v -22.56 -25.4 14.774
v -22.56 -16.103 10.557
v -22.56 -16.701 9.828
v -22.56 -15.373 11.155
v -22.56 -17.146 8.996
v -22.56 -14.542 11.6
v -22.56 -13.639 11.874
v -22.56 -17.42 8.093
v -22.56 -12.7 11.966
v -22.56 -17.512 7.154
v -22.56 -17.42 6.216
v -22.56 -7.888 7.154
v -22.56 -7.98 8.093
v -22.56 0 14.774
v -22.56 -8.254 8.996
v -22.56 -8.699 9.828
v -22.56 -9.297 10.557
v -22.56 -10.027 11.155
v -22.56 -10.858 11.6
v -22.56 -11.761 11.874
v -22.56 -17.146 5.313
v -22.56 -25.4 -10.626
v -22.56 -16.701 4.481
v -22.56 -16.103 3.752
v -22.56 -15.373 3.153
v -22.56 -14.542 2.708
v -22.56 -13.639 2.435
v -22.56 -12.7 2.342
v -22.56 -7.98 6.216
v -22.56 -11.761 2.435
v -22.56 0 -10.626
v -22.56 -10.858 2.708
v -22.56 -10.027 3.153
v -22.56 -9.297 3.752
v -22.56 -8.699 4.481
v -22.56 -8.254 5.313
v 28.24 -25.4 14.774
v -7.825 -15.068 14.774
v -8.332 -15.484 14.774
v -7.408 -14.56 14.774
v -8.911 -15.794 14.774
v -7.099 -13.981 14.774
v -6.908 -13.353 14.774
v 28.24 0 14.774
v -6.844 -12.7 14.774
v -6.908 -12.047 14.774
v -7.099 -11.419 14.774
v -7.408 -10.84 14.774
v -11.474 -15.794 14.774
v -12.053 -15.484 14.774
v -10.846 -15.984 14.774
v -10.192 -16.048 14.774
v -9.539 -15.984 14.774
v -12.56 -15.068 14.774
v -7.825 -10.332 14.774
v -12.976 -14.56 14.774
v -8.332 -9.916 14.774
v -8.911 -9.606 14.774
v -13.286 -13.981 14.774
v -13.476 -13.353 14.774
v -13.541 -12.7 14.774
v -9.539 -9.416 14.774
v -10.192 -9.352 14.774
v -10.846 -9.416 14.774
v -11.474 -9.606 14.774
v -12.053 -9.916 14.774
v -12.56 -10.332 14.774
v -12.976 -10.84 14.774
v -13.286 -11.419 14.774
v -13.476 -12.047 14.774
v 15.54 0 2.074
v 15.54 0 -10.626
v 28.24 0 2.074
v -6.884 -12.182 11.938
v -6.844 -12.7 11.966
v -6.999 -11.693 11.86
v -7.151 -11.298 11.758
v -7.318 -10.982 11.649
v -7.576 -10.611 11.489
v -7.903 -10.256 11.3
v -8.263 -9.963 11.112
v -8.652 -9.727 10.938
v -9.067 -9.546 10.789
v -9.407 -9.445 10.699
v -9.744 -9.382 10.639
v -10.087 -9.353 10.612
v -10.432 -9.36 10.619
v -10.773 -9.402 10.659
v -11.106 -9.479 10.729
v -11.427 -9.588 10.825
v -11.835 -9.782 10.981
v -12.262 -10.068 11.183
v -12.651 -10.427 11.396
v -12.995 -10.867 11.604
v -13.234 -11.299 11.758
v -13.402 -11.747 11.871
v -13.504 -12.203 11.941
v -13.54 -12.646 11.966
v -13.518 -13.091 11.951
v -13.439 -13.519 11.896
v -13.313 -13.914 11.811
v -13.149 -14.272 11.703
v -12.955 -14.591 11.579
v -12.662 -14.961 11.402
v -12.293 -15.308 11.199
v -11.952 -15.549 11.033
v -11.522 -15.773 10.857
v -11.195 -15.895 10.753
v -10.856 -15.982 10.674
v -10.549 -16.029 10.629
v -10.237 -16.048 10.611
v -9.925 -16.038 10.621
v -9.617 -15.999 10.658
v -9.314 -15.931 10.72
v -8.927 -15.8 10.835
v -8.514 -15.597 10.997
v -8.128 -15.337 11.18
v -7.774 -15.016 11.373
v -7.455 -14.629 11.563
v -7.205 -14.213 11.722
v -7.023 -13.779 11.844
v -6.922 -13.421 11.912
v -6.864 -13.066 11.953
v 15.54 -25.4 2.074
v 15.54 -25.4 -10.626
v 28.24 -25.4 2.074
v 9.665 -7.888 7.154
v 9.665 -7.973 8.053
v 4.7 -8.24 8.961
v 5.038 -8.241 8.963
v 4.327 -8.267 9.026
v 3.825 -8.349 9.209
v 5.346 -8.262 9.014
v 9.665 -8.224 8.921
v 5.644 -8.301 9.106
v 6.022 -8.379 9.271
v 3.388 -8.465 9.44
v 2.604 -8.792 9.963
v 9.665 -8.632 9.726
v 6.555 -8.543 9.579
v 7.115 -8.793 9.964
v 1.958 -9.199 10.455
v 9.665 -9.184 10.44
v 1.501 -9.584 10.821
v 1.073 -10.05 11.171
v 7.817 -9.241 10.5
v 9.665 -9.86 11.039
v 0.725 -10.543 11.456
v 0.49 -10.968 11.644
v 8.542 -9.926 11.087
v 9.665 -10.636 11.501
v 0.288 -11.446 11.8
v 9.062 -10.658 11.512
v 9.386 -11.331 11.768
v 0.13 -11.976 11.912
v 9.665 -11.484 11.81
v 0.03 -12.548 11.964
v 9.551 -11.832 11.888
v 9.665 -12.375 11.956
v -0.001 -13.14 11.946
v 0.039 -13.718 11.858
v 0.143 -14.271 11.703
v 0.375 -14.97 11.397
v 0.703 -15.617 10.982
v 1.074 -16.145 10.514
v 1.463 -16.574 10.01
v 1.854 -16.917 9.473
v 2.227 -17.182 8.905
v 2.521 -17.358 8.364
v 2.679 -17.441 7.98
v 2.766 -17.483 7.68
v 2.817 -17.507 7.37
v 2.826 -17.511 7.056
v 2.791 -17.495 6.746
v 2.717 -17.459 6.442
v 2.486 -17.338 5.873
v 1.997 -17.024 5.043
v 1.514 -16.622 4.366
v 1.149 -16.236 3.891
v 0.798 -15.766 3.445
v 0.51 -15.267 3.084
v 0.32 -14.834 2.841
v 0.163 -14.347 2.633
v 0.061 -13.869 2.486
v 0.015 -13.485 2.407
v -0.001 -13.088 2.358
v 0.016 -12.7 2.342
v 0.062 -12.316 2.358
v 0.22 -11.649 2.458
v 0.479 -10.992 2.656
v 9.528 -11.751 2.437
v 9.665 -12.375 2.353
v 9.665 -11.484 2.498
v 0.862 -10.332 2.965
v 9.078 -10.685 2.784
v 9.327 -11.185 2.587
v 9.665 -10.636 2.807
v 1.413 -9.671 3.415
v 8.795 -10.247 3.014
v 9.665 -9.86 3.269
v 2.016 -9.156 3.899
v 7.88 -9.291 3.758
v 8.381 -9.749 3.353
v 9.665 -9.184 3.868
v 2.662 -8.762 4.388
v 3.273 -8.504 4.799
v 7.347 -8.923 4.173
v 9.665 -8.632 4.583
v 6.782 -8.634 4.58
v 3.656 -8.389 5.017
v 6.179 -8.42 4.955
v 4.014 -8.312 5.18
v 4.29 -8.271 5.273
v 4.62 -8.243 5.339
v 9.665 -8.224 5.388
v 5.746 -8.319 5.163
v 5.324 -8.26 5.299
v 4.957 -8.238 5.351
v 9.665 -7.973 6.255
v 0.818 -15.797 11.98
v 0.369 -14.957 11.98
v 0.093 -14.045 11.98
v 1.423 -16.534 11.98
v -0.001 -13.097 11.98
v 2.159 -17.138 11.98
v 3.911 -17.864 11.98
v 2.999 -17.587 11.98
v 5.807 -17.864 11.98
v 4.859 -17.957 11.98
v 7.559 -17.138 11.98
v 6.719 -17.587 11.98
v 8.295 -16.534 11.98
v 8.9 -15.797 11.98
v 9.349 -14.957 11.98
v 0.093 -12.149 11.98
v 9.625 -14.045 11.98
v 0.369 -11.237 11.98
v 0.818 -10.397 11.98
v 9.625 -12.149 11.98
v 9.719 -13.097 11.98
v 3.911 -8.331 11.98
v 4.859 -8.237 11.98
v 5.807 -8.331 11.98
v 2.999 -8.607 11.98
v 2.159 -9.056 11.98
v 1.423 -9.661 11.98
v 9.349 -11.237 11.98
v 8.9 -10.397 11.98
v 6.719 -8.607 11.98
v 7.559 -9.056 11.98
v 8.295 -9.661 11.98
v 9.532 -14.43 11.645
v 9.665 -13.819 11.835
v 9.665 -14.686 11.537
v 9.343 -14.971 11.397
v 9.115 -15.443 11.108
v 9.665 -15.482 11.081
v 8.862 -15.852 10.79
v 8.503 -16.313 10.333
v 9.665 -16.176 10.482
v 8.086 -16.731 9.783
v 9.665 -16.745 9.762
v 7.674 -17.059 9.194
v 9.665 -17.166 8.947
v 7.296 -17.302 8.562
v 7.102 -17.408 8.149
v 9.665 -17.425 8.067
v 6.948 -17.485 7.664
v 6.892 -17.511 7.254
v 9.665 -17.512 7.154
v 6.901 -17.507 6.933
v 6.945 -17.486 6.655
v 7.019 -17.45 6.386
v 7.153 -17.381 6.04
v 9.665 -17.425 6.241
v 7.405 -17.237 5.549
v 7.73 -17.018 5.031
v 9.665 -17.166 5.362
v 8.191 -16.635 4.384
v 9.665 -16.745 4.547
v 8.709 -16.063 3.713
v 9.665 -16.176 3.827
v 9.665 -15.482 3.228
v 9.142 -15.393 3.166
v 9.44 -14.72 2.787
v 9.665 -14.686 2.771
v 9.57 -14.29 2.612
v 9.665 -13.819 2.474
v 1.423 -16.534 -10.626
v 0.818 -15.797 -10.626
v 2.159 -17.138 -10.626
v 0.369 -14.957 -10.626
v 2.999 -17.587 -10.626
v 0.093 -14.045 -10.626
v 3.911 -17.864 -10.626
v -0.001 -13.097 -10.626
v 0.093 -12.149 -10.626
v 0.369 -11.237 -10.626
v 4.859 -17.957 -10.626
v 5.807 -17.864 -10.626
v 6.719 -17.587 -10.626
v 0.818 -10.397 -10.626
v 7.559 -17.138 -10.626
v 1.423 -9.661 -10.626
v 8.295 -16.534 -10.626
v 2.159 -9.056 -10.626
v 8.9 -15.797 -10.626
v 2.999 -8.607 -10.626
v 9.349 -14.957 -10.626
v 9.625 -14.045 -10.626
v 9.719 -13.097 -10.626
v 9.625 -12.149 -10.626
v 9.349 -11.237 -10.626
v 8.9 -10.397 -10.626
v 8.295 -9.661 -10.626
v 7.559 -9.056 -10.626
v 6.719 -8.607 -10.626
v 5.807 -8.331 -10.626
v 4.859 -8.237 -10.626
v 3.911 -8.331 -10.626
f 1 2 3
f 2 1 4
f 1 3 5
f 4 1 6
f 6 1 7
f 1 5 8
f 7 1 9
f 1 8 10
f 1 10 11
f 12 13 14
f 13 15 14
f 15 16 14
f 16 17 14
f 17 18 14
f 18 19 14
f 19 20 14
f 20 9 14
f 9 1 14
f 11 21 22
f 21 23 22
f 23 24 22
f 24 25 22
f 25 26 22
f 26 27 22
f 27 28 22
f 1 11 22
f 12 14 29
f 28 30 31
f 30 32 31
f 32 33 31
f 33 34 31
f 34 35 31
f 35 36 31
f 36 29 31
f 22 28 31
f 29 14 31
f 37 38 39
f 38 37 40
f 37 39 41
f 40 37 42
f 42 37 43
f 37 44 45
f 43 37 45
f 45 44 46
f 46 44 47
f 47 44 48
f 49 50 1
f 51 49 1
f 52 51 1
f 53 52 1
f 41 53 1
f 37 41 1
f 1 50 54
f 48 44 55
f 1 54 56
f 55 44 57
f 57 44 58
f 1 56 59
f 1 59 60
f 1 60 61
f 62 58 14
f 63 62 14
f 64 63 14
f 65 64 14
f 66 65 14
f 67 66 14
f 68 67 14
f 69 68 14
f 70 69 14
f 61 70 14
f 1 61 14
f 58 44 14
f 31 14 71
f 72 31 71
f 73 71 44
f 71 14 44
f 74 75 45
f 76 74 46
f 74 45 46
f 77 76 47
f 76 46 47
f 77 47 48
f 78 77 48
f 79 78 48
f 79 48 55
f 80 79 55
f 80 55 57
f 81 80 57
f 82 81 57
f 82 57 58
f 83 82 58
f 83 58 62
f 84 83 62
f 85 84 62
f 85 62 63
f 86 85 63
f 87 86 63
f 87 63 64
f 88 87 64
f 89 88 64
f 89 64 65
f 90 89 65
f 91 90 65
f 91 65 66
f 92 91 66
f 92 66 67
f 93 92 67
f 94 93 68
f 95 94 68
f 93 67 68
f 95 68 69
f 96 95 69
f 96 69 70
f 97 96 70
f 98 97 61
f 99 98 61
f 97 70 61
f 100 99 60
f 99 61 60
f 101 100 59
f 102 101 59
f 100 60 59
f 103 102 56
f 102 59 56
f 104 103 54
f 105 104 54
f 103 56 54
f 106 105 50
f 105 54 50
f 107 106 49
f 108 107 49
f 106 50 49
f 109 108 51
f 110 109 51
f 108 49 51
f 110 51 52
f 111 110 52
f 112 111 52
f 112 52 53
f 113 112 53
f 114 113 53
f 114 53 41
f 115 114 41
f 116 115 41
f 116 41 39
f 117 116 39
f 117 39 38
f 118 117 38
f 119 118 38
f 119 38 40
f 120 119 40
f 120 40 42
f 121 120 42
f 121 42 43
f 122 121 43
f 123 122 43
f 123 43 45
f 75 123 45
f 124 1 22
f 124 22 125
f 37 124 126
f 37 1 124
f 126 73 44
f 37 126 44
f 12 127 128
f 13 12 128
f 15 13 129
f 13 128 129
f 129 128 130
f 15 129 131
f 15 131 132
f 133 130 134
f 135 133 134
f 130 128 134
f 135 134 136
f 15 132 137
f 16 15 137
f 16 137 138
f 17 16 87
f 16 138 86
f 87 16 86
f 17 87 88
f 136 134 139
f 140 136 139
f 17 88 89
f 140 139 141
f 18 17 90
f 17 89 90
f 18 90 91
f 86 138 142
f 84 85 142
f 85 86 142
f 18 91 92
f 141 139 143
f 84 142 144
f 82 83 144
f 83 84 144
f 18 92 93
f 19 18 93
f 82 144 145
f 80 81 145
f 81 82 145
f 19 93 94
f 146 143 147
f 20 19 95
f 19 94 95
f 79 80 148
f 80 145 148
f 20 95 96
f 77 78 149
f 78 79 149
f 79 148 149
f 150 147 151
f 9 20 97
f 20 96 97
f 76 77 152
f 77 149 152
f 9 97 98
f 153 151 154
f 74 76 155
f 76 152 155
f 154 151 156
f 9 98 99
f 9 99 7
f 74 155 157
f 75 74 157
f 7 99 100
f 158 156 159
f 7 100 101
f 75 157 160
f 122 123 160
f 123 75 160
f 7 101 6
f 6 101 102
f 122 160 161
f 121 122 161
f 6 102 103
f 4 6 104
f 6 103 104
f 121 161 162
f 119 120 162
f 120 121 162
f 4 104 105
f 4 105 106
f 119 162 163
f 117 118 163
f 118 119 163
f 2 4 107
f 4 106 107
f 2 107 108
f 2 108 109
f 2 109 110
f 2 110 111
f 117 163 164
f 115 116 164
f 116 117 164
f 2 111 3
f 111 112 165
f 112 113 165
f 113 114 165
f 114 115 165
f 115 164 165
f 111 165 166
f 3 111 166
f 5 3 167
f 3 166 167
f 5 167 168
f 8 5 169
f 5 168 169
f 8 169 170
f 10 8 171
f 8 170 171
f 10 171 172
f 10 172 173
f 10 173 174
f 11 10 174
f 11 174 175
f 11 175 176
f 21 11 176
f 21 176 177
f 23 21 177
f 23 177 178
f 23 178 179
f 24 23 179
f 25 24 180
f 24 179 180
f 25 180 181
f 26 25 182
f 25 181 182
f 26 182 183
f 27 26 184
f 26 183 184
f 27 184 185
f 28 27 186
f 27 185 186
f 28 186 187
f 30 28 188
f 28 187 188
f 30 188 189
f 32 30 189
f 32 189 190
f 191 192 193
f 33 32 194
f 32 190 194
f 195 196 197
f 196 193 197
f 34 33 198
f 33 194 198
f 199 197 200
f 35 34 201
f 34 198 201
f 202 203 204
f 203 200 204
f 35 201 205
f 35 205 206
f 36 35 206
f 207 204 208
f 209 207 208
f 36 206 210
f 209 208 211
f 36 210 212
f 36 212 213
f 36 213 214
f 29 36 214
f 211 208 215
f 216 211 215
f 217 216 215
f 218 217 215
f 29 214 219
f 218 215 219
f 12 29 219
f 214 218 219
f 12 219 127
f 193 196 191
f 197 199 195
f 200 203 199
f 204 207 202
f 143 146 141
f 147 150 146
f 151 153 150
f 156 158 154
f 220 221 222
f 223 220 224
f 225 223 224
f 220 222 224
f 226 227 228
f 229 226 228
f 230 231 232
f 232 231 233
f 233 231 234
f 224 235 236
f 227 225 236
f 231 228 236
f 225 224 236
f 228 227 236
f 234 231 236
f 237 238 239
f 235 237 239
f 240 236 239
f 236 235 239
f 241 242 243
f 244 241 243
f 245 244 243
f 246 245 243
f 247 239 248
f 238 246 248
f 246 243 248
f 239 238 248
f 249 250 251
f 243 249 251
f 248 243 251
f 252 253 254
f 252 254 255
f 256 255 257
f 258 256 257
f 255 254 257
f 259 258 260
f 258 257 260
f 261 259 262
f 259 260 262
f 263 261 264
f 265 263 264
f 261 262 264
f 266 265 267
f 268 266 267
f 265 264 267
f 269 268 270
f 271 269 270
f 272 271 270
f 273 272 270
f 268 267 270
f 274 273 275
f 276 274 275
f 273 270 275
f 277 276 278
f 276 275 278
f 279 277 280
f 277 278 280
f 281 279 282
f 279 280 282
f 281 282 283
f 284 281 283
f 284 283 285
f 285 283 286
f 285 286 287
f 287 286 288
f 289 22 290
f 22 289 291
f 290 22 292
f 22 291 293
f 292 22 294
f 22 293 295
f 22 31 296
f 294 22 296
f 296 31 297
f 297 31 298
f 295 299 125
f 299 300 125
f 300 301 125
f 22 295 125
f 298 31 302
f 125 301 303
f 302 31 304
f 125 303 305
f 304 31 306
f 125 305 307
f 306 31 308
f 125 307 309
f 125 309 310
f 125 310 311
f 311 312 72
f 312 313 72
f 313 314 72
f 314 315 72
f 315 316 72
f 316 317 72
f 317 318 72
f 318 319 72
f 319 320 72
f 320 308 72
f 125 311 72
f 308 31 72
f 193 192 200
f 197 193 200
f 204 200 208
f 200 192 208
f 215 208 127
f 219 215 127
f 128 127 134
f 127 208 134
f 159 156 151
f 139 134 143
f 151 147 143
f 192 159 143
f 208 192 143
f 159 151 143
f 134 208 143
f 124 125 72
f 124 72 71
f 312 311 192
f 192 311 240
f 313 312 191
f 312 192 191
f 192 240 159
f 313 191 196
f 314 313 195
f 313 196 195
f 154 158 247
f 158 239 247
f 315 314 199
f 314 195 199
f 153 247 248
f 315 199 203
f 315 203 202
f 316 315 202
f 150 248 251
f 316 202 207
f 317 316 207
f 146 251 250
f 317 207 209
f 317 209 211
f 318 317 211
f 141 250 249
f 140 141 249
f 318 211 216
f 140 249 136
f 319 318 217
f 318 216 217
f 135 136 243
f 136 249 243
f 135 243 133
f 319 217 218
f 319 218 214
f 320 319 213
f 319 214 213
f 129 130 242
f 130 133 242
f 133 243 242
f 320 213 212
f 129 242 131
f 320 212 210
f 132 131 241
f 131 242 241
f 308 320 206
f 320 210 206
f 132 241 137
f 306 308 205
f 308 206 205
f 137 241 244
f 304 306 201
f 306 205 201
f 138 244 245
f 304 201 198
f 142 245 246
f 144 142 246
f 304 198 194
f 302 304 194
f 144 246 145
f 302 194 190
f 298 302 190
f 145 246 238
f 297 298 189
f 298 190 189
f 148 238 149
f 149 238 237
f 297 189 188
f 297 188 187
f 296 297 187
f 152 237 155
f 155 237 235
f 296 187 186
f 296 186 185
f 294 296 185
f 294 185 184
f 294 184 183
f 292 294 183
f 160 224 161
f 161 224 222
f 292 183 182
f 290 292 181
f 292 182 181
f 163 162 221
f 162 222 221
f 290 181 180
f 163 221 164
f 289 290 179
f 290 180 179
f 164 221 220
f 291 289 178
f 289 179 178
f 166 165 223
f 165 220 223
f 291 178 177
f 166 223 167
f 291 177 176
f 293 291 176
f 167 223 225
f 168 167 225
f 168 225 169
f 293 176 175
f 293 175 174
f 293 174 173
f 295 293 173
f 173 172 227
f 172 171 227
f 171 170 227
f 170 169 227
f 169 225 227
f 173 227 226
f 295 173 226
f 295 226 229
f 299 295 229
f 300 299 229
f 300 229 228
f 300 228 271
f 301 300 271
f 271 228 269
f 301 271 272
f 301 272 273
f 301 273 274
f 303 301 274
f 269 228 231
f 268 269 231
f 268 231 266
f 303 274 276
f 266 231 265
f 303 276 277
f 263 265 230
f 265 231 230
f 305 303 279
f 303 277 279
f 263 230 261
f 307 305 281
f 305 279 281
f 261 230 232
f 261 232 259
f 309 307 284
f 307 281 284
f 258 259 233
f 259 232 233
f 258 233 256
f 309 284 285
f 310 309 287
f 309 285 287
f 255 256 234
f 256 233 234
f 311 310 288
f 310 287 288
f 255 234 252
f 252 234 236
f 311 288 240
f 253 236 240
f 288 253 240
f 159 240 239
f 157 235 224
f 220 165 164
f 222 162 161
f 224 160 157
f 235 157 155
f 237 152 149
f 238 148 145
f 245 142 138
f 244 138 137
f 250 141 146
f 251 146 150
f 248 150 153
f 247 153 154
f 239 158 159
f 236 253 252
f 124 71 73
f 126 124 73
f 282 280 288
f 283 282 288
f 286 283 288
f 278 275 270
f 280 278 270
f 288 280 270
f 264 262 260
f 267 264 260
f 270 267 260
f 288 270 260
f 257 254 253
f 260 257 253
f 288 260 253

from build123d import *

# Parameters (mm, degrees)
F1_DEPTH = 25.4
F3_R     = 4.8121462922
F4_DEPTH = 50.8
F6_R     = 4.8597300297
F7_DEPTH = 25.4
F8_R     = 3.348410215
F9_DEPTH = 7.62


with BuildPart() as f1:
    # F0 (on Front) → F1 (new body)
    with BuildSketch(Plane.XZ):
        Polygon((-22.5596427917, 14.7743310452), (-22.5596427917, -10.6256689548), (15.5403572083, -10.6256689548), (15.5403572083, 2.0743310452), (28.2403572083, 2.0743310452), (28.2403572083, 14.7743310452), align=None)
    extrude(amount=F1_DEPTH)

    # F3 (on offset) → F4 (cut)
    with BuildSketch(Plane.YZ.offset(9.6647944301)):
        with Locations((-12.7, 7.1543310452)):
            Circle(F3_R)
    extrude(amount=-F4_DEPTH, mode=Mode.SUBTRACT)

    # F6 (on offset) → F7 (cut)
    with BuildSketch(Plane.XY.offset(11.9803310452)):
        with Locations((4.8589497015, -13.0971787283)):
            Circle(F6_R)
    extrude(amount=-F7_DEPTH, mode=Mode.SUBTRACT)

    # F8 (on face) → F9 (cut)
    with BuildSketch(Plane.XY.offset(14.7743310452)):
        with Locations((-10.1922675967, -12.7)):
            Circle(F8_R)
    extrude(amount=-F9_DEPTH, mode=Mode.SUBTRACT)


solid = f1.part
